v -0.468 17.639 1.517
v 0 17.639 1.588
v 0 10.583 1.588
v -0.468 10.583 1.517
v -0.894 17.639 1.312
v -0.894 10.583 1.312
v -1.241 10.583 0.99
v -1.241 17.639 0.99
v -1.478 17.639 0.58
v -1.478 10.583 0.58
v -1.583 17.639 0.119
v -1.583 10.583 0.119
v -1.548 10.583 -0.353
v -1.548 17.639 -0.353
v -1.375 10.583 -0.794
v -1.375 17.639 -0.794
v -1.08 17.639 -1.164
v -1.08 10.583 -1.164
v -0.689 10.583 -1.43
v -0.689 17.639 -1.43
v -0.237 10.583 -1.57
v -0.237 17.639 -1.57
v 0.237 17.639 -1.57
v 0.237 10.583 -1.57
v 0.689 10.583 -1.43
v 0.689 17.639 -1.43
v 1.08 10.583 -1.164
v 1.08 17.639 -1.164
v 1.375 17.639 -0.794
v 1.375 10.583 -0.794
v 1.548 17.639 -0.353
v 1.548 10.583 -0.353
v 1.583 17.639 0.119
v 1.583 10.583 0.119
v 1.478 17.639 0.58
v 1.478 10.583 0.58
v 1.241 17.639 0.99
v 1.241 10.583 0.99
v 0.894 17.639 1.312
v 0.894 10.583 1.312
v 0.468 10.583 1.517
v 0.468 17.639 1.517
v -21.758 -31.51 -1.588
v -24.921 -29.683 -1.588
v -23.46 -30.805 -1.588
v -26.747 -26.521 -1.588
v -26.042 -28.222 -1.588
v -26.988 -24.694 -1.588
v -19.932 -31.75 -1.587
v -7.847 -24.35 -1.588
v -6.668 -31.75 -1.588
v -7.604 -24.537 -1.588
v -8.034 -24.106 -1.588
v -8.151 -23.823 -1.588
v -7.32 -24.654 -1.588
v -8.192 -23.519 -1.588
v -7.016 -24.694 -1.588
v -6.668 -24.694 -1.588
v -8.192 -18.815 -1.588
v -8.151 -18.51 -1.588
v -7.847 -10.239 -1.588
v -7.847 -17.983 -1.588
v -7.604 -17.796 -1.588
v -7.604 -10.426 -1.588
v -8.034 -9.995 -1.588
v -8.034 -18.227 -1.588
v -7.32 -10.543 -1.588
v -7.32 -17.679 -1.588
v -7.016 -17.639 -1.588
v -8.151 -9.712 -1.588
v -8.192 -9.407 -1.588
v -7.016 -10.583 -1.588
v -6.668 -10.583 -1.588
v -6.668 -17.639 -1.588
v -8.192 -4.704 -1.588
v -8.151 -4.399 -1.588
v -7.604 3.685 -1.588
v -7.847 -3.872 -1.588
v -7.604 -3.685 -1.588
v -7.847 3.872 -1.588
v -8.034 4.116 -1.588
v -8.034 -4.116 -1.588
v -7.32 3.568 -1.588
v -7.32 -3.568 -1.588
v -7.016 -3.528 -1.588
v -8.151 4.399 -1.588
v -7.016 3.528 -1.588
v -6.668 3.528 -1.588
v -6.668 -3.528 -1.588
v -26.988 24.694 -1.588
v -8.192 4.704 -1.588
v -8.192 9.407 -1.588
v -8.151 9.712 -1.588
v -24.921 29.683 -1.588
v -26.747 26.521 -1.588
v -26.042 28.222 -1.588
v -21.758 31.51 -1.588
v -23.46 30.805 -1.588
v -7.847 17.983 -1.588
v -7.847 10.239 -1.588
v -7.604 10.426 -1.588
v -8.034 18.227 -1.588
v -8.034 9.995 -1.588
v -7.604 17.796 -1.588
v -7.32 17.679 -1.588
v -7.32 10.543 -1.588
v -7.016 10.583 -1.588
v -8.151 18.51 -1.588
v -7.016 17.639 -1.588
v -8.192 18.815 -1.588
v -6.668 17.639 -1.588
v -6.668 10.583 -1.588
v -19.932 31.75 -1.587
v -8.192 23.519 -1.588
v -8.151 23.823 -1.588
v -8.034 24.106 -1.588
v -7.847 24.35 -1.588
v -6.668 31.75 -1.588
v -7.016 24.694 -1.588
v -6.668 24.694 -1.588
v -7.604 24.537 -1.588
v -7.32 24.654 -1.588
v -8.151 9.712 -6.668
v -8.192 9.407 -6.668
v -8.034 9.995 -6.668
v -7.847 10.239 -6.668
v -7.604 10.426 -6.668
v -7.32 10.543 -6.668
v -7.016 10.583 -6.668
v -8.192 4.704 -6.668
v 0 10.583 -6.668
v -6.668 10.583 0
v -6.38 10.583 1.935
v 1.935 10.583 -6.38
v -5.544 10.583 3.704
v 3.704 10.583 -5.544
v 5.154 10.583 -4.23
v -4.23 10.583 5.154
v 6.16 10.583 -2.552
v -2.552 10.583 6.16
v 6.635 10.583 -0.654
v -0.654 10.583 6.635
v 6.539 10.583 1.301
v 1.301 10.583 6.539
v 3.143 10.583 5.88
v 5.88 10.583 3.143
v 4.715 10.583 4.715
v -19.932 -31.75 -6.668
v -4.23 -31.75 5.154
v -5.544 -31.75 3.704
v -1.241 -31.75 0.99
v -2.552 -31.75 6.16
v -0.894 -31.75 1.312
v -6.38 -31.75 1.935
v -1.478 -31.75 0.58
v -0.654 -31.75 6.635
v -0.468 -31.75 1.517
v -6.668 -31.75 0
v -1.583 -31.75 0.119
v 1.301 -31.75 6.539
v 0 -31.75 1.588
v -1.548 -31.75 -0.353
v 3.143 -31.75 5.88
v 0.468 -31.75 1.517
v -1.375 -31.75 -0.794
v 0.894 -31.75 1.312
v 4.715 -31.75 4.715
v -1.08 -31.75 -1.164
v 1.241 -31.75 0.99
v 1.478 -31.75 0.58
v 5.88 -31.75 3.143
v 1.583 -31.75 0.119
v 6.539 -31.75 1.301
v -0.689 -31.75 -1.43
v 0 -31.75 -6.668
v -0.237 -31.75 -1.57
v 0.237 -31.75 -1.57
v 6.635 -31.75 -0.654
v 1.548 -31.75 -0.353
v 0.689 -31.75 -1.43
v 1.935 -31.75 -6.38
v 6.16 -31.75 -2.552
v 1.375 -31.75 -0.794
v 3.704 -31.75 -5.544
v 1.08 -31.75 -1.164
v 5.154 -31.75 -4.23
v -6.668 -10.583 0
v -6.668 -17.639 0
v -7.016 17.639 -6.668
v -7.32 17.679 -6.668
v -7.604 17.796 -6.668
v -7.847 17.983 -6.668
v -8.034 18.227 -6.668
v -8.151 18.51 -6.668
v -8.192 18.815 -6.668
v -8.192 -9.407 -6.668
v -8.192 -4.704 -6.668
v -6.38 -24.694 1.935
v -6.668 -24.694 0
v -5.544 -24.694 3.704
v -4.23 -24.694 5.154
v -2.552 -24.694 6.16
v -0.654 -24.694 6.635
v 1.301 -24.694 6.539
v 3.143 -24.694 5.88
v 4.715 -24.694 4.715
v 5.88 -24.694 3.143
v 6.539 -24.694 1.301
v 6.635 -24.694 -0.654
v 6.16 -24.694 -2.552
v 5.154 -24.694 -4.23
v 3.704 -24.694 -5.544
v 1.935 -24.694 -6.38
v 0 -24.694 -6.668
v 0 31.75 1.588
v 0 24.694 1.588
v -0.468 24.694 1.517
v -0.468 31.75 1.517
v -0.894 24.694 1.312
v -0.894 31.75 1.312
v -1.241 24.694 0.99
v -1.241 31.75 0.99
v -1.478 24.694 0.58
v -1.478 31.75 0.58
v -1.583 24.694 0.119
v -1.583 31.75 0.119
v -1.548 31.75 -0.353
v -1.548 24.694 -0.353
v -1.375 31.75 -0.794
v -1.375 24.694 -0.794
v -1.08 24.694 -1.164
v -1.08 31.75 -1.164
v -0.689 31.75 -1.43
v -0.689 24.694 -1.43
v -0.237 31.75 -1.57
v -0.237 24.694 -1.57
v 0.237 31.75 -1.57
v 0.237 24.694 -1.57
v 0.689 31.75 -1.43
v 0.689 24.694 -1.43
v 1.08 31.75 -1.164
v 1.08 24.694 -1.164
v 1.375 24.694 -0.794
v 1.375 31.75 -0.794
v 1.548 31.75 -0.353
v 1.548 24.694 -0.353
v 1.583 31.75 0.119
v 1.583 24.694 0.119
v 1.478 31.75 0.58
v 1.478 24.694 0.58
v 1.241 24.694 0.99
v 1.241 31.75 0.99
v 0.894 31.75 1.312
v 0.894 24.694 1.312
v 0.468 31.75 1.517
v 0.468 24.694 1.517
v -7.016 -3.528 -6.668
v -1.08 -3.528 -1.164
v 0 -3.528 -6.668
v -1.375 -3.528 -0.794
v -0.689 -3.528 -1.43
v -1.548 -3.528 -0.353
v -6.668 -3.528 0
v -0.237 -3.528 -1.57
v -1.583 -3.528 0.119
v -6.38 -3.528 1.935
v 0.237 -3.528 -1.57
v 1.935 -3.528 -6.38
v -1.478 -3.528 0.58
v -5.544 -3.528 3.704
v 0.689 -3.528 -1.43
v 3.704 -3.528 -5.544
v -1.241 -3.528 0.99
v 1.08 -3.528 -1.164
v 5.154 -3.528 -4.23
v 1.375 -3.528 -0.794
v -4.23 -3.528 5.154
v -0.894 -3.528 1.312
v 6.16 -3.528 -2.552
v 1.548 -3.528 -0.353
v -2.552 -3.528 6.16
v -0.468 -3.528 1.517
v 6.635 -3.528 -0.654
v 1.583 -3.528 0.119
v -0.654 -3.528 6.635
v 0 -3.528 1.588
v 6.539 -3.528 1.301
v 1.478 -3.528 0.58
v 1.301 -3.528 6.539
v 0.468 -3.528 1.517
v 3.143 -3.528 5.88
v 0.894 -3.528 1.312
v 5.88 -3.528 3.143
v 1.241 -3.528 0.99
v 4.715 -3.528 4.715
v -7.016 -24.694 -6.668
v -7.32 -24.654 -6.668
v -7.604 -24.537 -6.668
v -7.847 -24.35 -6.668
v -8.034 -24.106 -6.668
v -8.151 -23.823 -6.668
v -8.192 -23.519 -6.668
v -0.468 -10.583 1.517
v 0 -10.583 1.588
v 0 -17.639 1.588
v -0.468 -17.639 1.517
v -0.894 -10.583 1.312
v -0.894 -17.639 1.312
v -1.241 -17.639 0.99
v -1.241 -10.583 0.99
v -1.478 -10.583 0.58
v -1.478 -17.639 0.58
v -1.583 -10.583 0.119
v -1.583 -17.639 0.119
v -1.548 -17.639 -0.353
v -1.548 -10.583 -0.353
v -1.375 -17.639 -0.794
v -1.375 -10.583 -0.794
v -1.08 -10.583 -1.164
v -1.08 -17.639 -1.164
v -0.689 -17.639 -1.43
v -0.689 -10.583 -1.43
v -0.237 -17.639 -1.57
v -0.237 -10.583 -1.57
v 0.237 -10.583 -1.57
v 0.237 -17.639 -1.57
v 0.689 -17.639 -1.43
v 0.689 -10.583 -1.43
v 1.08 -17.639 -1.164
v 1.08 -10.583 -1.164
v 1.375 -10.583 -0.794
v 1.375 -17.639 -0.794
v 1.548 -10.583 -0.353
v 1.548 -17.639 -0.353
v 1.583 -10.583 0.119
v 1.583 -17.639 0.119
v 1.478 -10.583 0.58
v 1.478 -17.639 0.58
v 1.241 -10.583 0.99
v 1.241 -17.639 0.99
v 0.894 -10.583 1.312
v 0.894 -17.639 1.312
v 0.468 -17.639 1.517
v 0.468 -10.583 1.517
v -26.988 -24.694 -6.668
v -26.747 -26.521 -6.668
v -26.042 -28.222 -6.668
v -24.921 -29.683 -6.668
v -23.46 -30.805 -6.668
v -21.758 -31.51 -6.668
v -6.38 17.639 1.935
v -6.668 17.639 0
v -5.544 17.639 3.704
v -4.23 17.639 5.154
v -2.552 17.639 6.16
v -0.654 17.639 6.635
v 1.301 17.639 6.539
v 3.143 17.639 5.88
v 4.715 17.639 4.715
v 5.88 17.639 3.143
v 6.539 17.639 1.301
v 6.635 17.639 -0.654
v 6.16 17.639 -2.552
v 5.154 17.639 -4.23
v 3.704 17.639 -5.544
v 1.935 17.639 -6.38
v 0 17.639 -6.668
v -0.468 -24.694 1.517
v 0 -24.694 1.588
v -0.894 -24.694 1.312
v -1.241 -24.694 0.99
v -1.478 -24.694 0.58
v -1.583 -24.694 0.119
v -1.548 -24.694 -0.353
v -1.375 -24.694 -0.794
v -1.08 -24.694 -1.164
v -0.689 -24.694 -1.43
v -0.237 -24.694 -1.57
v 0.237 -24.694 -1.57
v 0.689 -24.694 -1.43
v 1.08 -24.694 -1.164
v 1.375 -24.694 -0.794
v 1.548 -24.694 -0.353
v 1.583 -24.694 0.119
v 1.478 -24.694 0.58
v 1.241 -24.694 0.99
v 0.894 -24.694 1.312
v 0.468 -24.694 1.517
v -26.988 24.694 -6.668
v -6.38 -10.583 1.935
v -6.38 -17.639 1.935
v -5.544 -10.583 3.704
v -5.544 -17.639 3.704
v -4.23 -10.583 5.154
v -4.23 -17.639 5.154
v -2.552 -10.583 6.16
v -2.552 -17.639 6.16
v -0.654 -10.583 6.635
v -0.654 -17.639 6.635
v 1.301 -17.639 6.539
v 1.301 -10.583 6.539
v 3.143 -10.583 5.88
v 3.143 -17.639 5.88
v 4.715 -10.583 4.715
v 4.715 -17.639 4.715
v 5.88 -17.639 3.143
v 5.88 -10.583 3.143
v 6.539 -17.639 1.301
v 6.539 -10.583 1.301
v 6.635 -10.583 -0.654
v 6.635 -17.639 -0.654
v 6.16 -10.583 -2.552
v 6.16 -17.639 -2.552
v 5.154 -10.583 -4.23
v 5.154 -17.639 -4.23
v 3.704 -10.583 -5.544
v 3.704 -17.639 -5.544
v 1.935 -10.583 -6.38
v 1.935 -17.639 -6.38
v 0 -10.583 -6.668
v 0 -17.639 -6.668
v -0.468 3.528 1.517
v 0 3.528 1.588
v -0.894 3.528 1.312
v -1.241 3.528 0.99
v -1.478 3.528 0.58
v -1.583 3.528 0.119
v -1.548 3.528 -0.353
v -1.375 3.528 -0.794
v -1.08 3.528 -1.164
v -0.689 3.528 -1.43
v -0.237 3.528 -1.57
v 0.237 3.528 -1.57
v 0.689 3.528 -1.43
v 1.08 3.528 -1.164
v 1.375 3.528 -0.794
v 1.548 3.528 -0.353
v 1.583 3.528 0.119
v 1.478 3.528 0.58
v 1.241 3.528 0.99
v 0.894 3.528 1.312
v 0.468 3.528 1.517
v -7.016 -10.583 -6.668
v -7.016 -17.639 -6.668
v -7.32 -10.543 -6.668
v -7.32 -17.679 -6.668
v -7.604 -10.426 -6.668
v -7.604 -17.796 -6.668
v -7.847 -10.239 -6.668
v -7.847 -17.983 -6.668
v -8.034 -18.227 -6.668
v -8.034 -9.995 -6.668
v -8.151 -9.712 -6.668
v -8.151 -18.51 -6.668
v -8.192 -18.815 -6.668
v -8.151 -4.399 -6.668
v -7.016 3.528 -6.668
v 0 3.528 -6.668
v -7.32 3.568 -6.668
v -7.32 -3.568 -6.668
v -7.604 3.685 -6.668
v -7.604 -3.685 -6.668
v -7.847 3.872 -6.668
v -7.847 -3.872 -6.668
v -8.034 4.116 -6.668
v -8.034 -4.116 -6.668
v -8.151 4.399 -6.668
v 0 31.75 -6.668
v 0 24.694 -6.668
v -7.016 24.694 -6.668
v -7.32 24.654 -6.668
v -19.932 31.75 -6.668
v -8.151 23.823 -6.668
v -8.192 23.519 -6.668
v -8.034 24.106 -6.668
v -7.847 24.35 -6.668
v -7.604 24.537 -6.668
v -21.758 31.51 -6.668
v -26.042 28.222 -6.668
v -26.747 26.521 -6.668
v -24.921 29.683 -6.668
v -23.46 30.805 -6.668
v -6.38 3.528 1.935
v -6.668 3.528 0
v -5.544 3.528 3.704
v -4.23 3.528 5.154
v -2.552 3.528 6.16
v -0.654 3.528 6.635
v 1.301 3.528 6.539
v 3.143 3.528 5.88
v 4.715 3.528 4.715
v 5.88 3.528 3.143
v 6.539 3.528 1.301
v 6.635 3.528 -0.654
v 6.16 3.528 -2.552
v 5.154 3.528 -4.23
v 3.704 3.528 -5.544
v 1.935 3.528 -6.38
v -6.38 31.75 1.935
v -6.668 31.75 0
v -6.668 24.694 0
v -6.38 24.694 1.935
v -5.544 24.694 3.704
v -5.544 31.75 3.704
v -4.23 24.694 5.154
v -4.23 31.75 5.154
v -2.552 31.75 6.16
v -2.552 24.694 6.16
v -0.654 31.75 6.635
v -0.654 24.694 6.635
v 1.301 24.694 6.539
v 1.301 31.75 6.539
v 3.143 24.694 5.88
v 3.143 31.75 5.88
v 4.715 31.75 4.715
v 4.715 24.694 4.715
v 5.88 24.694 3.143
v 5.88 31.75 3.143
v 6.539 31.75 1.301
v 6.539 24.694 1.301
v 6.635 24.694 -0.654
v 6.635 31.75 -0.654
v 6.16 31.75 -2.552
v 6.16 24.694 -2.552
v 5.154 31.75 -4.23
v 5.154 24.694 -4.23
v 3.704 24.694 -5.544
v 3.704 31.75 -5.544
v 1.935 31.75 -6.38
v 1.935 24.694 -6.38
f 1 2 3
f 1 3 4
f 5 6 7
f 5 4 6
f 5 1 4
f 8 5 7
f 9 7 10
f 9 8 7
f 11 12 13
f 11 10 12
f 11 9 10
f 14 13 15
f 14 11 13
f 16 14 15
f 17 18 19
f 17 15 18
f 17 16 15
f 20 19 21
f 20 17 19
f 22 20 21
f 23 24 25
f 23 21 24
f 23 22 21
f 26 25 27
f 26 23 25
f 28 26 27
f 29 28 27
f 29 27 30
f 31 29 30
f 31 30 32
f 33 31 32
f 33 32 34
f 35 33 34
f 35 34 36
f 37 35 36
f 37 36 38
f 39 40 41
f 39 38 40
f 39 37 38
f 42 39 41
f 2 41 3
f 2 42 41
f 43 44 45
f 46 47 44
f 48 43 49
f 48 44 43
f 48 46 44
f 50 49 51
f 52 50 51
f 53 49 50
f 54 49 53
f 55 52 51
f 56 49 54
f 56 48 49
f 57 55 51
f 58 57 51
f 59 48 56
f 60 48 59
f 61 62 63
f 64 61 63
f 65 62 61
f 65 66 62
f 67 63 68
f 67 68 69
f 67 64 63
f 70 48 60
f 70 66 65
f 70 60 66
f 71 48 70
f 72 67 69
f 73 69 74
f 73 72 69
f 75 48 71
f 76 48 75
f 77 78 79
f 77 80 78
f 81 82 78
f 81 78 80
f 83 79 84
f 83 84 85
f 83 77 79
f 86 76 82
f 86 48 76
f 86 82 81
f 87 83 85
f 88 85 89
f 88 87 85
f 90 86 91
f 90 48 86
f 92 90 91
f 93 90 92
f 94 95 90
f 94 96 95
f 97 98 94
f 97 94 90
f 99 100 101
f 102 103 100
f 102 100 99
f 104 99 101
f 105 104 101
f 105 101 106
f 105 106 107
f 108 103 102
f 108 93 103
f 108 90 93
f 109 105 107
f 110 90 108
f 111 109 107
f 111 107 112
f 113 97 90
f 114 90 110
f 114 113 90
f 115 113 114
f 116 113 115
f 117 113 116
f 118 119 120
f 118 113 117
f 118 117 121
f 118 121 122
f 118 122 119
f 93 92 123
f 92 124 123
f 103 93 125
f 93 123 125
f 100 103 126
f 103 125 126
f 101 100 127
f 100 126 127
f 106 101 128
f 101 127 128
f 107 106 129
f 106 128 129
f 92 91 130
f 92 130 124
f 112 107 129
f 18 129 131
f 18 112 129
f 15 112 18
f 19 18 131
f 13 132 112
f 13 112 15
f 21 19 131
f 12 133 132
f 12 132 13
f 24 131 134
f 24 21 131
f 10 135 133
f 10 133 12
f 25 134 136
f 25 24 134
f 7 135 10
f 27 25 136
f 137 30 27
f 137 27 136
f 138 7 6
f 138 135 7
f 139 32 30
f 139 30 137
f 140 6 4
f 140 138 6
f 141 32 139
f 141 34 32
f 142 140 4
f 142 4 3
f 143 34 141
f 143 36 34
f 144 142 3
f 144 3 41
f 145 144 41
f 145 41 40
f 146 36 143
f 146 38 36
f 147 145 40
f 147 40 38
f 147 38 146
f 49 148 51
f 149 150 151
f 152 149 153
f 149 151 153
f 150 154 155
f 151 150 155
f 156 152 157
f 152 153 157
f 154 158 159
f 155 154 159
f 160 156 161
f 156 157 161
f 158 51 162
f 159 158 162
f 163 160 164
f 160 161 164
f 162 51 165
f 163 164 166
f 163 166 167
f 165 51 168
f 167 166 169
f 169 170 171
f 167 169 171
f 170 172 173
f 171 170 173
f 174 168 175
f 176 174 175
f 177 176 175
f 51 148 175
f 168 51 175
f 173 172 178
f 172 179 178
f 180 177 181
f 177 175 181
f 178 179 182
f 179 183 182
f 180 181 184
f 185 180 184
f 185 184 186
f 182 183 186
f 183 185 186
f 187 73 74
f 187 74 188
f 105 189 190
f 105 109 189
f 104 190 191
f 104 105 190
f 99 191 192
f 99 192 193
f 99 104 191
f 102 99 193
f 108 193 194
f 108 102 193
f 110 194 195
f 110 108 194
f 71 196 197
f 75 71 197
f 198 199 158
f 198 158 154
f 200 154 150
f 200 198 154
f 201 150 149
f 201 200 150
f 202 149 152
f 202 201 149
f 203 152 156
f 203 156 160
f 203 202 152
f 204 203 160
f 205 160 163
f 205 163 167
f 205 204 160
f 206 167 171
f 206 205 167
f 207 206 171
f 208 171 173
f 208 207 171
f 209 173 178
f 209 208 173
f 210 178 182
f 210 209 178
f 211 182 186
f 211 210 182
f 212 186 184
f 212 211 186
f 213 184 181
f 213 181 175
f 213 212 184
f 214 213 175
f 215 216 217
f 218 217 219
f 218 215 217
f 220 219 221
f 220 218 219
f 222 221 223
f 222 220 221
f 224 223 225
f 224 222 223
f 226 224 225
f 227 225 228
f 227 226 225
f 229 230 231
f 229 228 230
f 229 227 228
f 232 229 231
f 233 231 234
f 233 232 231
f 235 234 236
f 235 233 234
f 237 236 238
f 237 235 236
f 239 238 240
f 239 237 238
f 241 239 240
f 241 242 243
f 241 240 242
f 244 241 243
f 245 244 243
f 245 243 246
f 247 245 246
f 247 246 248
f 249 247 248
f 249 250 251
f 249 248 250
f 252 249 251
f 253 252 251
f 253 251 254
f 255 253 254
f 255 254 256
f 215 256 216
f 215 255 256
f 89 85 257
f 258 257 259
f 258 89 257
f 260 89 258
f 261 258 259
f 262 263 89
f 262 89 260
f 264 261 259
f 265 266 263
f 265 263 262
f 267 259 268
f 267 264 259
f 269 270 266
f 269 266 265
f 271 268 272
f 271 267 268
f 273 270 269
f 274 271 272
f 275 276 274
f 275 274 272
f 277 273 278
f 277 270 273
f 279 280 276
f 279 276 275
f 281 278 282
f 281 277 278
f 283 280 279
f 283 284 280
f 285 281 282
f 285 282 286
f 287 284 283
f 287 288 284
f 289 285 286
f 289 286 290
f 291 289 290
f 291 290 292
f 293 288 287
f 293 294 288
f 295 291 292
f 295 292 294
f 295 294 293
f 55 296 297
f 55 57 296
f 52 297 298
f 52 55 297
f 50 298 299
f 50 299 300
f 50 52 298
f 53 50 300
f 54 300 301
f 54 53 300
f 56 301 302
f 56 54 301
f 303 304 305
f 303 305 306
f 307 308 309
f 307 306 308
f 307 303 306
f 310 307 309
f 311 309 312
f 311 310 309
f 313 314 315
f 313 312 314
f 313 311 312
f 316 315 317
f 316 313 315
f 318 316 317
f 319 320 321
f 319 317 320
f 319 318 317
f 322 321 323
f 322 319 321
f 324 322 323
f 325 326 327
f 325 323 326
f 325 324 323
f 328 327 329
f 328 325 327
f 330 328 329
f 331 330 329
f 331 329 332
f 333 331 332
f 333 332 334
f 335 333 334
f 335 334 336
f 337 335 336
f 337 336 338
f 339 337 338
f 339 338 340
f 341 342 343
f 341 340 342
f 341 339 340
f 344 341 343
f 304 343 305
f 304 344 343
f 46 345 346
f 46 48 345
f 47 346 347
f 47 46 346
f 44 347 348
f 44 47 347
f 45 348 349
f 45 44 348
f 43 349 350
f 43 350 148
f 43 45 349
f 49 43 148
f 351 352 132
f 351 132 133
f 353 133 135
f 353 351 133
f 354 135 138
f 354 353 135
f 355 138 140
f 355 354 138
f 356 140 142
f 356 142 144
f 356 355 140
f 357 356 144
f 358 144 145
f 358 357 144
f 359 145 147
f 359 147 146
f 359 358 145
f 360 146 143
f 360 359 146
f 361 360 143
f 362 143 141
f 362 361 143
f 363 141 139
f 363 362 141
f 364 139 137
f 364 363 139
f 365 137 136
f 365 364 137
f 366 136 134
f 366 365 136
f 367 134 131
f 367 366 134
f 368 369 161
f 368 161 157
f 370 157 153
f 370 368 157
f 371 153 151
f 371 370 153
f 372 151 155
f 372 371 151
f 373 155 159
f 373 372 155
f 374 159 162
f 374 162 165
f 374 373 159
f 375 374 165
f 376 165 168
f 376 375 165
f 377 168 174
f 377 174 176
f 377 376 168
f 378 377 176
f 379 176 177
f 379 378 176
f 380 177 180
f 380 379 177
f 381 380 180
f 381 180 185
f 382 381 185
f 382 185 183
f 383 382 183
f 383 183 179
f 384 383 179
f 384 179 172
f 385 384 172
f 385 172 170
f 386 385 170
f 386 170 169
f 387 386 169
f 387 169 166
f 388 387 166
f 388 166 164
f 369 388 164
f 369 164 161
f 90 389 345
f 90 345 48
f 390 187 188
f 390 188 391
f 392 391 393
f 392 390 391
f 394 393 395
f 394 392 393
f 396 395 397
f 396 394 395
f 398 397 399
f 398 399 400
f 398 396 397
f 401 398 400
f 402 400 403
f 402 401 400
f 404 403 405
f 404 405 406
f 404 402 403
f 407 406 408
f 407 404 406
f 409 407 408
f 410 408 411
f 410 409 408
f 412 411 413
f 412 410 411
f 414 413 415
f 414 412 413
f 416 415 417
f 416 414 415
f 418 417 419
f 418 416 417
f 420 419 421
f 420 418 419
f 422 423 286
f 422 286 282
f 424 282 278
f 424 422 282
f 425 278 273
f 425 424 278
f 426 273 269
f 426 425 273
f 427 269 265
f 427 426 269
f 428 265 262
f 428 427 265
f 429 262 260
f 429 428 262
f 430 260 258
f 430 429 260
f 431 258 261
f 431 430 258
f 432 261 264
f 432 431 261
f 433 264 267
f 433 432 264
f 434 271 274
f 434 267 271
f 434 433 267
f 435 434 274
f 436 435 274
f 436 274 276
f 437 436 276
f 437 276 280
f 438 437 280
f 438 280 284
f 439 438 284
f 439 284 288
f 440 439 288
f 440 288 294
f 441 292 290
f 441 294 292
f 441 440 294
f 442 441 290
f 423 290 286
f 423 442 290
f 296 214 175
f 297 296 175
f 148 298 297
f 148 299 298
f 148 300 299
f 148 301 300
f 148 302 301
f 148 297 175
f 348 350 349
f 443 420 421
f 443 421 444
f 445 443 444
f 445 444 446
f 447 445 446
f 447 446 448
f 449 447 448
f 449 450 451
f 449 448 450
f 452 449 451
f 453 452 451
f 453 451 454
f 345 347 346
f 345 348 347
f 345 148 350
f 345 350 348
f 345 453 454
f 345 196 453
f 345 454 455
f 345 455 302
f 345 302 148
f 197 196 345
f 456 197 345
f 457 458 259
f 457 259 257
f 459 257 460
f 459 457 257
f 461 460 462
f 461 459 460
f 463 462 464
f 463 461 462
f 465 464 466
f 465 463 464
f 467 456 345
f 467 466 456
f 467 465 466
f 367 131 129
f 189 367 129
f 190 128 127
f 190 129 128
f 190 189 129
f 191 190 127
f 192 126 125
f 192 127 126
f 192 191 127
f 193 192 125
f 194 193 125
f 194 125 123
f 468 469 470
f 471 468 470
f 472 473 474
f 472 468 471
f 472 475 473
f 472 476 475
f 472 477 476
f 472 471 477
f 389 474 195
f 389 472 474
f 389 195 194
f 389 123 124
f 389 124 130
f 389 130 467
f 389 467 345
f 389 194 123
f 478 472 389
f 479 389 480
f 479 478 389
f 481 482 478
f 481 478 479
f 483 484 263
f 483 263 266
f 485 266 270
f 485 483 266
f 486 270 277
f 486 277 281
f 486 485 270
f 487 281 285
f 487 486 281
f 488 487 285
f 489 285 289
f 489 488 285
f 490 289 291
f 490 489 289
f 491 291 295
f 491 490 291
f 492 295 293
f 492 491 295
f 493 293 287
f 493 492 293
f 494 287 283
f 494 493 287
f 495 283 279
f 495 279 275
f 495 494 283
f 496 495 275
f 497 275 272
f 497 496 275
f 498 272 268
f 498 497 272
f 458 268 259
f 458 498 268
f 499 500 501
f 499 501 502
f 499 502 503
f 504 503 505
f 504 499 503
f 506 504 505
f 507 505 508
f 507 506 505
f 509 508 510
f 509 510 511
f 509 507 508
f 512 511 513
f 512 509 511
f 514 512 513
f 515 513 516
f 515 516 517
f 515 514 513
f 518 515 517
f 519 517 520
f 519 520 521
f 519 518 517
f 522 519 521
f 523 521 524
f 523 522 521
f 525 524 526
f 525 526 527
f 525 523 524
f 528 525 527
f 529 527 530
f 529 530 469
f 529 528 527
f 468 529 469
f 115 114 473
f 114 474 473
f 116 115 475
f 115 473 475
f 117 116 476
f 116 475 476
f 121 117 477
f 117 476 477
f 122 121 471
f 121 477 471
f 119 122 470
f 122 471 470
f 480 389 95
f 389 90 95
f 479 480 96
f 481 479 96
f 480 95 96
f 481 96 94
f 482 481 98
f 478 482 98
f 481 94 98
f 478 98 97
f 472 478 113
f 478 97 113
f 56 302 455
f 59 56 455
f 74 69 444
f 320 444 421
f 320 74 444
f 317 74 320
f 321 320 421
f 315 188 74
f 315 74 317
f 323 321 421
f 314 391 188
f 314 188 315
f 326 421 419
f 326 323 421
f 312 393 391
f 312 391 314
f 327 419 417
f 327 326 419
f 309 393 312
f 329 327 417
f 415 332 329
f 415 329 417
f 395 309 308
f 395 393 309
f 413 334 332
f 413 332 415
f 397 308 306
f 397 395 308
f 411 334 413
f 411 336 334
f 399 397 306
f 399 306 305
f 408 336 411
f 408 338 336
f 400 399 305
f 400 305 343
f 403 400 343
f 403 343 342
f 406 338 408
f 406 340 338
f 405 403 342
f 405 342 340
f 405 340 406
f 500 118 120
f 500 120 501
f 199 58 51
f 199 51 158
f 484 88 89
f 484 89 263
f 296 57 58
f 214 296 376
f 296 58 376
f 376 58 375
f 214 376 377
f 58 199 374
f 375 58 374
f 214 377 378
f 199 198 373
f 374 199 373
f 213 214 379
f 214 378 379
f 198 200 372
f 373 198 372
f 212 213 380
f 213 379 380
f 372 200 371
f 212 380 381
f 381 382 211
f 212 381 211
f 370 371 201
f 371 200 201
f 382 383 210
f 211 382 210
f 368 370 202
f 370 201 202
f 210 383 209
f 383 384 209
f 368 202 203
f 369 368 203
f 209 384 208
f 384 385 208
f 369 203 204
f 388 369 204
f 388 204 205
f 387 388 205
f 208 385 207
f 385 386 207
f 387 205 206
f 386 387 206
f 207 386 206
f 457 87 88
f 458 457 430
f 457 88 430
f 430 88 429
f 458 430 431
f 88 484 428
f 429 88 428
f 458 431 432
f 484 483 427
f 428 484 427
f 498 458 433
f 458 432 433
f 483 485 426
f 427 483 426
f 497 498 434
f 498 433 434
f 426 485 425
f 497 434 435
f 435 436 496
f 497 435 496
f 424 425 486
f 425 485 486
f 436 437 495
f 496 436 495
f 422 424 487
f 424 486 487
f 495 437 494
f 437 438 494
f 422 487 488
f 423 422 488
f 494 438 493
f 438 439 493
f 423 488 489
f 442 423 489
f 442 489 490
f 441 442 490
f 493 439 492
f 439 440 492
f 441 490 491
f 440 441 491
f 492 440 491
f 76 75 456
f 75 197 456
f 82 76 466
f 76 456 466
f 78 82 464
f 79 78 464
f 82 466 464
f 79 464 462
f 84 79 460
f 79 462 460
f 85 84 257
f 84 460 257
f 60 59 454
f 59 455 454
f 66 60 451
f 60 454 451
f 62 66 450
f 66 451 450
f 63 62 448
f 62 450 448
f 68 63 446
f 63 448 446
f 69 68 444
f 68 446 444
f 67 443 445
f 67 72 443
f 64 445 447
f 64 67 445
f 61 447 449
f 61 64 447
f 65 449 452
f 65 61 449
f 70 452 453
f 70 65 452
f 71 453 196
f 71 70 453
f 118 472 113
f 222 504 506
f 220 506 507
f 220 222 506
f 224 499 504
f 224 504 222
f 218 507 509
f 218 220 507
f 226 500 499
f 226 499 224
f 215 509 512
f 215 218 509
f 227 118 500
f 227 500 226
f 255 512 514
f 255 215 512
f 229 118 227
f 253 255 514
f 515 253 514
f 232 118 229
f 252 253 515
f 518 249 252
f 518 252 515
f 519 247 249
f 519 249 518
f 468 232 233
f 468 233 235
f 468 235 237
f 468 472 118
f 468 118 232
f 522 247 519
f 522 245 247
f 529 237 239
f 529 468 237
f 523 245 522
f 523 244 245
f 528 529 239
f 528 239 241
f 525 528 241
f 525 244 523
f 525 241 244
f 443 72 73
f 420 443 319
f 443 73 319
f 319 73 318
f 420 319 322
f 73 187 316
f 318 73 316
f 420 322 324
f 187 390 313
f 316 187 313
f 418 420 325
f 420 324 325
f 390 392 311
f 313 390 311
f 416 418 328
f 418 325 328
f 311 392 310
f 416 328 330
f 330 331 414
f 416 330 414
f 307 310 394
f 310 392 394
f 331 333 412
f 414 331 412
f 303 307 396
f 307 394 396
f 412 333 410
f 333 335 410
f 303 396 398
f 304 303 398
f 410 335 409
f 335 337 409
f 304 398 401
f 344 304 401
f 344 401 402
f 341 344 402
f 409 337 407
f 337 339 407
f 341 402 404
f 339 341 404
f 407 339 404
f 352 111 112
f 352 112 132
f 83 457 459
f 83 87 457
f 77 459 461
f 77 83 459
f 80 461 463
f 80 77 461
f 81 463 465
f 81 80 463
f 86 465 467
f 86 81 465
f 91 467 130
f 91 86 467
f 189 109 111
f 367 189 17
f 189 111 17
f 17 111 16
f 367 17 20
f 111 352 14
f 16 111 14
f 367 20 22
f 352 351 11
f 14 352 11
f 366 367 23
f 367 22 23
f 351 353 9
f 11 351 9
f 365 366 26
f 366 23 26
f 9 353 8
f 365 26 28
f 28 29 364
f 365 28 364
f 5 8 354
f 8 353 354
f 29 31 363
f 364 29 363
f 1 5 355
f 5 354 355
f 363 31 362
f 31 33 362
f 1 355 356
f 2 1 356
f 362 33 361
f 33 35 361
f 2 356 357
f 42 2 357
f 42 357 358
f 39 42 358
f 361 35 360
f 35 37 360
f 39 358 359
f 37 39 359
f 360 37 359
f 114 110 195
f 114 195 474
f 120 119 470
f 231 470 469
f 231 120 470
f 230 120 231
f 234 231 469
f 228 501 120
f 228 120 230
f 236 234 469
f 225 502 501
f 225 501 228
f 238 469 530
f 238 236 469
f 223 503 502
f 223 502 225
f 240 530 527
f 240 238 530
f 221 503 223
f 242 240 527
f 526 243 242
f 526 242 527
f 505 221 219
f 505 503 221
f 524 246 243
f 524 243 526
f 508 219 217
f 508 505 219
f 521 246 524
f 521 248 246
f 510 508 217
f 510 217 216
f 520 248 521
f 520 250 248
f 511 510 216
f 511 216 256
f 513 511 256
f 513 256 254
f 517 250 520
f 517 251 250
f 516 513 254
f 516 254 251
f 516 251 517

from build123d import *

# Parameters (mm, degrees)
BOSS_EXTRUDE1_START = 31.75
SKETCH3_R           = 1.5875
BOSS_EXTRUDE1_DEPTH = 63.5
FILLET1_R           = 7.055555556
SKETCH5_W           = 16.383
SKETCH5_H           = 7.055555556
CUT_EXTRUDE1_DEPTH  = 43.200038063
LPATTERN1_COUNT     = 5
LPATTERN1_PITCH     = 14.111111111
FILLET2_R           = 1.175925926
SKETCH6_W           = 16.383
SKETCH6_H           = 7.055555555
CUT_EXTRUDE2_DEPTH  = 43.200038063
LPATTERN2_COUNT     = 4
LPATTERN2_PITCH     = 14.111111111
FILLET3_R           = 1.175925926
FILLET4_R           = 0.391975309
BOSS_EXTRUDE3_START = 31.75
SKETCH7_R           = 1.5875
BOSS_EXTRUDE3_DEPTH = 63.5


with BuildPart() as part:
    # Sketch3 → Boss-Extrude1 (new body)
    with BuildSketch(Plane(origin=(0, 0, 0), x_dir=(1, 0, 0), z_dir=(0, 1, 0)).offset(BOSS_EXTRUDE1_START)):
        with BuildLine():
            Line((26.9875, 6.6675), (26.9875, 1.5875))
            Line((26.9875, 1.5875), (6.6675, 1.5875))
            Line((6.6675, 1.5875), (6.6675, 0))
            ThreePointArc((6.6675, 0), (-4.714634464, -4.714634464), (0, 6.6675))
            Line((0, 6.6675), (26.9875, 6.6675))
        make_face()
        with Locations(Location((0, 0, 0), (0, 0, 270))):
            Circle(SKETCH3_R, mode=Mode.SUBTRACT)
    extrude(amount=-BOSS_EXTRUDE1_DEPTH)

    # Fillet1
    fillet1_edges = [part.edges().sort_by_distance(p)[0] for p in [
        (26.9875, -31.75, -4.1275),
        (26.9875, 31.75, -4.1275),
    ]]
    fillet(fillet1_edges, radius=FILLET1_R)


with BuildPart() as body_2:
    # Mirror1: mirrored copy
    add(part.part.mirror(Plane(origin=(0, 0, 0), x_dir=(0, 0, 1), z_dir=(1, 0, 0))))

    # Sketch6 → Cut-Extrude2 (cut, symmetric)
    with BuildSketch(Plane.XY):
        with Locations((0, 21.166666666)):
            Rectangle(SKETCH6_W, SKETCH6_H)
    cut_extrude2 = extrude(amount=CUT_EXTRUDE2_DEPTH, both=True, mode=Mode.SUBTRACT)

    # LPattern2: Cut-Extrude2 ×4
    with Locations(*[(0, -i * LPATTERN2_PITCH, 0) for i in range(1, LPATTERN2_COUNT)]):
        add(cut_extrude2, mode=Mode.SUBTRACT)

    # Fillet3
    fillet3_edges = [body_2.edges().sort_by_distance(p)[0] for p in [
        (-8.1915, 10.583333333, -4.1275),
        (-8.1915, 3.527777778, -4.1275),
        (-8.1915, -3.527777778, -4.1275),
        (-8.1915, -10.583333333, -4.1275),
        (-8.1915, -17.638888889, -4.1275),
        (-8.1915, -24.694444444, -4.1275),
        (-8.1915, 24.694444444, -4.1275),
        (-8.1915, 17.638888889, -4.1275),
    ]]
    fillet(fillet3_edges, radius=FILLET3_R)


with BuildPart() as part_1:
    add(part.part)

    # Sketch5 → Cut-Extrude1 (cut, symmetric)
    with BuildSketch(Plane.XY):
        with Locations((0, 28.222222222)):
            Rectangle(SKETCH5_W, SKETCH5_H)
    cut_extrude1 = extrude(amount=CUT_EXTRUDE1_DEPTH, both=True, mode=Mode.SUBTRACT)

    # LPattern1: Cut-Extrude1 ×5
    with Locations(*[(0, -i * LPATTERN1_PITCH, 0) for i in range(1, LPATTERN1_COUNT)]):
        add(cut_extrude1, mode=Mode.SUBTRACT)

    # Fillet2
    fillet2_edges = [part_1.edges().sort_by_distance(p)[0] for p in [
        (8.1915, -3.527777778, -4.1275),
        (8.1915, 3.527777778, -4.1275),
        (8.1915, -17.638888889, -4.1275),
        (8.1915, -10.583333333, -4.1275),
        (8.1915, -24.694444444, -4.1275),
        (8.1915, 24.694444444, -4.1275),
        (8.1915, 10.583333333, -4.1275),
        (8.1915, 17.638888889, -4.1275),
    ]]
    fillet(fillet2_edges, radius=FILLET2_R)

    # Fillet4
    fillet4_edges = [part_1.edges().sort_by_distance(p)[0] for p in [
        (8.1915, -31.75, -4.1275),
        (8.1915, 31.75, -4.1275),
    ]]
    fillet(fillet4_edges, radius=FILLET4_R)


with BuildPart() as body_3:
    # Sketch7 → Boss-Extrude3 (new body)
    with BuildSketch(Plane(origin=(0, 0, 0), x_dir=(1, 0, 0), z_dir=(0, 1, 0)).offset(BOSS_EXTRUDE3_START)):
        with Locations(Location((0, 0, 0), (0, 0, 270))):
            Circle(SKETCH7_R)
    extrude(amount=-BOSS_EXTRUDE3_DEPTH)


solid = body_2.part
